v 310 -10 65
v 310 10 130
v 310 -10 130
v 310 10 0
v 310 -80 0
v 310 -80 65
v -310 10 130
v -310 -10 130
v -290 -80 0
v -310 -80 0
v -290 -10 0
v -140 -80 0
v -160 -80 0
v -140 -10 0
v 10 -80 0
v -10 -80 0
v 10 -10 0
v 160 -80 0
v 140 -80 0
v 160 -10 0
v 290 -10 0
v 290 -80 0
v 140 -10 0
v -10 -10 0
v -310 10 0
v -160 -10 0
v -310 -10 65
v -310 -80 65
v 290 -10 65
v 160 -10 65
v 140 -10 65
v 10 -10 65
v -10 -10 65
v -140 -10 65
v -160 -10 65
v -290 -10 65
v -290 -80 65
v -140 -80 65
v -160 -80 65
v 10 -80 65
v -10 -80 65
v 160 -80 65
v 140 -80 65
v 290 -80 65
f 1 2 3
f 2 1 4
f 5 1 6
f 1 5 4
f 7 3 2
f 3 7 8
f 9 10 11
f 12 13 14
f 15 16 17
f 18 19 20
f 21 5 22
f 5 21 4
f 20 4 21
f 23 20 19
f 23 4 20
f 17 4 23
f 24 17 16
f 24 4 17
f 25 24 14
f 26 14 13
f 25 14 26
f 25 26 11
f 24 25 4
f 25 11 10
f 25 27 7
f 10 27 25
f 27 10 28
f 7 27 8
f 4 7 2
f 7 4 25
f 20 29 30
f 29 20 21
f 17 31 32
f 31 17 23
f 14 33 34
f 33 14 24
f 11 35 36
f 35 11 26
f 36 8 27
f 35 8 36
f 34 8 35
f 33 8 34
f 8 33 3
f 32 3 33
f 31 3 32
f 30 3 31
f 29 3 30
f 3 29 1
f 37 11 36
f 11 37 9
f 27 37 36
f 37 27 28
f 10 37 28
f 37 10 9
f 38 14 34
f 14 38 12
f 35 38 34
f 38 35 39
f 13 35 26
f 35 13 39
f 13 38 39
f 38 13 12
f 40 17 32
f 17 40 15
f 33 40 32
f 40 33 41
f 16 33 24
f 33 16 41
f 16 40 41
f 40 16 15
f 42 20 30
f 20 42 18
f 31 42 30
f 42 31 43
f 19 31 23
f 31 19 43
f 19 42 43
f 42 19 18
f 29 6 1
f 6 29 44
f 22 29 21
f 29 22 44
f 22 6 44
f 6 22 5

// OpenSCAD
ww = 20;
wh = 65;
wo = 150;
wd = 70;

module ratf_machine() {
  difference() {
    union() {
      translate([0, 0, wh])
      cube([2 * wo + 2 * ww/2, ww, 2 * wh], center = true);

      translate([-wo, 0, wh/2])
      cube([ww, 2 * wd + ww, wh], center = true);

      translate([0, 0, wh/2])
      cube([ww, 2 * wd + ww, wh], center = true);

      translate([wo, 0, wh/2])
      cube([ww, 2 * wd + ww, wh], center = true);
    }  
  }
}

module ratf_warehouse() {
  difference() {
    union() {
      translate([0, 0, wh])
      cube([4 * wo + 2 * ww/2, ww, 2 * wh], center = true);

      translate([-2 * wo, -wd/2, wh/2])
      cube([ww, wd + ww, wh], center = true);

      translate([-wo,  -wd/2, wh/2])
      cube([ww, wd + ww, wh], center = true);

      translate([0,  -wd/2, wh/2])
      cube([ww, wd + ww, wh], center = true);

      translate([wo,  -wd/2, wh/2])
      cube([ww, wd + ww, wh], center = true);

      translate([2 * wo,  -wd/2, wh/2])
      cube([ww, wd + ww, wh], center = true);
    }  
  }
}


ratf_warehouse();
//ratf_machine();
